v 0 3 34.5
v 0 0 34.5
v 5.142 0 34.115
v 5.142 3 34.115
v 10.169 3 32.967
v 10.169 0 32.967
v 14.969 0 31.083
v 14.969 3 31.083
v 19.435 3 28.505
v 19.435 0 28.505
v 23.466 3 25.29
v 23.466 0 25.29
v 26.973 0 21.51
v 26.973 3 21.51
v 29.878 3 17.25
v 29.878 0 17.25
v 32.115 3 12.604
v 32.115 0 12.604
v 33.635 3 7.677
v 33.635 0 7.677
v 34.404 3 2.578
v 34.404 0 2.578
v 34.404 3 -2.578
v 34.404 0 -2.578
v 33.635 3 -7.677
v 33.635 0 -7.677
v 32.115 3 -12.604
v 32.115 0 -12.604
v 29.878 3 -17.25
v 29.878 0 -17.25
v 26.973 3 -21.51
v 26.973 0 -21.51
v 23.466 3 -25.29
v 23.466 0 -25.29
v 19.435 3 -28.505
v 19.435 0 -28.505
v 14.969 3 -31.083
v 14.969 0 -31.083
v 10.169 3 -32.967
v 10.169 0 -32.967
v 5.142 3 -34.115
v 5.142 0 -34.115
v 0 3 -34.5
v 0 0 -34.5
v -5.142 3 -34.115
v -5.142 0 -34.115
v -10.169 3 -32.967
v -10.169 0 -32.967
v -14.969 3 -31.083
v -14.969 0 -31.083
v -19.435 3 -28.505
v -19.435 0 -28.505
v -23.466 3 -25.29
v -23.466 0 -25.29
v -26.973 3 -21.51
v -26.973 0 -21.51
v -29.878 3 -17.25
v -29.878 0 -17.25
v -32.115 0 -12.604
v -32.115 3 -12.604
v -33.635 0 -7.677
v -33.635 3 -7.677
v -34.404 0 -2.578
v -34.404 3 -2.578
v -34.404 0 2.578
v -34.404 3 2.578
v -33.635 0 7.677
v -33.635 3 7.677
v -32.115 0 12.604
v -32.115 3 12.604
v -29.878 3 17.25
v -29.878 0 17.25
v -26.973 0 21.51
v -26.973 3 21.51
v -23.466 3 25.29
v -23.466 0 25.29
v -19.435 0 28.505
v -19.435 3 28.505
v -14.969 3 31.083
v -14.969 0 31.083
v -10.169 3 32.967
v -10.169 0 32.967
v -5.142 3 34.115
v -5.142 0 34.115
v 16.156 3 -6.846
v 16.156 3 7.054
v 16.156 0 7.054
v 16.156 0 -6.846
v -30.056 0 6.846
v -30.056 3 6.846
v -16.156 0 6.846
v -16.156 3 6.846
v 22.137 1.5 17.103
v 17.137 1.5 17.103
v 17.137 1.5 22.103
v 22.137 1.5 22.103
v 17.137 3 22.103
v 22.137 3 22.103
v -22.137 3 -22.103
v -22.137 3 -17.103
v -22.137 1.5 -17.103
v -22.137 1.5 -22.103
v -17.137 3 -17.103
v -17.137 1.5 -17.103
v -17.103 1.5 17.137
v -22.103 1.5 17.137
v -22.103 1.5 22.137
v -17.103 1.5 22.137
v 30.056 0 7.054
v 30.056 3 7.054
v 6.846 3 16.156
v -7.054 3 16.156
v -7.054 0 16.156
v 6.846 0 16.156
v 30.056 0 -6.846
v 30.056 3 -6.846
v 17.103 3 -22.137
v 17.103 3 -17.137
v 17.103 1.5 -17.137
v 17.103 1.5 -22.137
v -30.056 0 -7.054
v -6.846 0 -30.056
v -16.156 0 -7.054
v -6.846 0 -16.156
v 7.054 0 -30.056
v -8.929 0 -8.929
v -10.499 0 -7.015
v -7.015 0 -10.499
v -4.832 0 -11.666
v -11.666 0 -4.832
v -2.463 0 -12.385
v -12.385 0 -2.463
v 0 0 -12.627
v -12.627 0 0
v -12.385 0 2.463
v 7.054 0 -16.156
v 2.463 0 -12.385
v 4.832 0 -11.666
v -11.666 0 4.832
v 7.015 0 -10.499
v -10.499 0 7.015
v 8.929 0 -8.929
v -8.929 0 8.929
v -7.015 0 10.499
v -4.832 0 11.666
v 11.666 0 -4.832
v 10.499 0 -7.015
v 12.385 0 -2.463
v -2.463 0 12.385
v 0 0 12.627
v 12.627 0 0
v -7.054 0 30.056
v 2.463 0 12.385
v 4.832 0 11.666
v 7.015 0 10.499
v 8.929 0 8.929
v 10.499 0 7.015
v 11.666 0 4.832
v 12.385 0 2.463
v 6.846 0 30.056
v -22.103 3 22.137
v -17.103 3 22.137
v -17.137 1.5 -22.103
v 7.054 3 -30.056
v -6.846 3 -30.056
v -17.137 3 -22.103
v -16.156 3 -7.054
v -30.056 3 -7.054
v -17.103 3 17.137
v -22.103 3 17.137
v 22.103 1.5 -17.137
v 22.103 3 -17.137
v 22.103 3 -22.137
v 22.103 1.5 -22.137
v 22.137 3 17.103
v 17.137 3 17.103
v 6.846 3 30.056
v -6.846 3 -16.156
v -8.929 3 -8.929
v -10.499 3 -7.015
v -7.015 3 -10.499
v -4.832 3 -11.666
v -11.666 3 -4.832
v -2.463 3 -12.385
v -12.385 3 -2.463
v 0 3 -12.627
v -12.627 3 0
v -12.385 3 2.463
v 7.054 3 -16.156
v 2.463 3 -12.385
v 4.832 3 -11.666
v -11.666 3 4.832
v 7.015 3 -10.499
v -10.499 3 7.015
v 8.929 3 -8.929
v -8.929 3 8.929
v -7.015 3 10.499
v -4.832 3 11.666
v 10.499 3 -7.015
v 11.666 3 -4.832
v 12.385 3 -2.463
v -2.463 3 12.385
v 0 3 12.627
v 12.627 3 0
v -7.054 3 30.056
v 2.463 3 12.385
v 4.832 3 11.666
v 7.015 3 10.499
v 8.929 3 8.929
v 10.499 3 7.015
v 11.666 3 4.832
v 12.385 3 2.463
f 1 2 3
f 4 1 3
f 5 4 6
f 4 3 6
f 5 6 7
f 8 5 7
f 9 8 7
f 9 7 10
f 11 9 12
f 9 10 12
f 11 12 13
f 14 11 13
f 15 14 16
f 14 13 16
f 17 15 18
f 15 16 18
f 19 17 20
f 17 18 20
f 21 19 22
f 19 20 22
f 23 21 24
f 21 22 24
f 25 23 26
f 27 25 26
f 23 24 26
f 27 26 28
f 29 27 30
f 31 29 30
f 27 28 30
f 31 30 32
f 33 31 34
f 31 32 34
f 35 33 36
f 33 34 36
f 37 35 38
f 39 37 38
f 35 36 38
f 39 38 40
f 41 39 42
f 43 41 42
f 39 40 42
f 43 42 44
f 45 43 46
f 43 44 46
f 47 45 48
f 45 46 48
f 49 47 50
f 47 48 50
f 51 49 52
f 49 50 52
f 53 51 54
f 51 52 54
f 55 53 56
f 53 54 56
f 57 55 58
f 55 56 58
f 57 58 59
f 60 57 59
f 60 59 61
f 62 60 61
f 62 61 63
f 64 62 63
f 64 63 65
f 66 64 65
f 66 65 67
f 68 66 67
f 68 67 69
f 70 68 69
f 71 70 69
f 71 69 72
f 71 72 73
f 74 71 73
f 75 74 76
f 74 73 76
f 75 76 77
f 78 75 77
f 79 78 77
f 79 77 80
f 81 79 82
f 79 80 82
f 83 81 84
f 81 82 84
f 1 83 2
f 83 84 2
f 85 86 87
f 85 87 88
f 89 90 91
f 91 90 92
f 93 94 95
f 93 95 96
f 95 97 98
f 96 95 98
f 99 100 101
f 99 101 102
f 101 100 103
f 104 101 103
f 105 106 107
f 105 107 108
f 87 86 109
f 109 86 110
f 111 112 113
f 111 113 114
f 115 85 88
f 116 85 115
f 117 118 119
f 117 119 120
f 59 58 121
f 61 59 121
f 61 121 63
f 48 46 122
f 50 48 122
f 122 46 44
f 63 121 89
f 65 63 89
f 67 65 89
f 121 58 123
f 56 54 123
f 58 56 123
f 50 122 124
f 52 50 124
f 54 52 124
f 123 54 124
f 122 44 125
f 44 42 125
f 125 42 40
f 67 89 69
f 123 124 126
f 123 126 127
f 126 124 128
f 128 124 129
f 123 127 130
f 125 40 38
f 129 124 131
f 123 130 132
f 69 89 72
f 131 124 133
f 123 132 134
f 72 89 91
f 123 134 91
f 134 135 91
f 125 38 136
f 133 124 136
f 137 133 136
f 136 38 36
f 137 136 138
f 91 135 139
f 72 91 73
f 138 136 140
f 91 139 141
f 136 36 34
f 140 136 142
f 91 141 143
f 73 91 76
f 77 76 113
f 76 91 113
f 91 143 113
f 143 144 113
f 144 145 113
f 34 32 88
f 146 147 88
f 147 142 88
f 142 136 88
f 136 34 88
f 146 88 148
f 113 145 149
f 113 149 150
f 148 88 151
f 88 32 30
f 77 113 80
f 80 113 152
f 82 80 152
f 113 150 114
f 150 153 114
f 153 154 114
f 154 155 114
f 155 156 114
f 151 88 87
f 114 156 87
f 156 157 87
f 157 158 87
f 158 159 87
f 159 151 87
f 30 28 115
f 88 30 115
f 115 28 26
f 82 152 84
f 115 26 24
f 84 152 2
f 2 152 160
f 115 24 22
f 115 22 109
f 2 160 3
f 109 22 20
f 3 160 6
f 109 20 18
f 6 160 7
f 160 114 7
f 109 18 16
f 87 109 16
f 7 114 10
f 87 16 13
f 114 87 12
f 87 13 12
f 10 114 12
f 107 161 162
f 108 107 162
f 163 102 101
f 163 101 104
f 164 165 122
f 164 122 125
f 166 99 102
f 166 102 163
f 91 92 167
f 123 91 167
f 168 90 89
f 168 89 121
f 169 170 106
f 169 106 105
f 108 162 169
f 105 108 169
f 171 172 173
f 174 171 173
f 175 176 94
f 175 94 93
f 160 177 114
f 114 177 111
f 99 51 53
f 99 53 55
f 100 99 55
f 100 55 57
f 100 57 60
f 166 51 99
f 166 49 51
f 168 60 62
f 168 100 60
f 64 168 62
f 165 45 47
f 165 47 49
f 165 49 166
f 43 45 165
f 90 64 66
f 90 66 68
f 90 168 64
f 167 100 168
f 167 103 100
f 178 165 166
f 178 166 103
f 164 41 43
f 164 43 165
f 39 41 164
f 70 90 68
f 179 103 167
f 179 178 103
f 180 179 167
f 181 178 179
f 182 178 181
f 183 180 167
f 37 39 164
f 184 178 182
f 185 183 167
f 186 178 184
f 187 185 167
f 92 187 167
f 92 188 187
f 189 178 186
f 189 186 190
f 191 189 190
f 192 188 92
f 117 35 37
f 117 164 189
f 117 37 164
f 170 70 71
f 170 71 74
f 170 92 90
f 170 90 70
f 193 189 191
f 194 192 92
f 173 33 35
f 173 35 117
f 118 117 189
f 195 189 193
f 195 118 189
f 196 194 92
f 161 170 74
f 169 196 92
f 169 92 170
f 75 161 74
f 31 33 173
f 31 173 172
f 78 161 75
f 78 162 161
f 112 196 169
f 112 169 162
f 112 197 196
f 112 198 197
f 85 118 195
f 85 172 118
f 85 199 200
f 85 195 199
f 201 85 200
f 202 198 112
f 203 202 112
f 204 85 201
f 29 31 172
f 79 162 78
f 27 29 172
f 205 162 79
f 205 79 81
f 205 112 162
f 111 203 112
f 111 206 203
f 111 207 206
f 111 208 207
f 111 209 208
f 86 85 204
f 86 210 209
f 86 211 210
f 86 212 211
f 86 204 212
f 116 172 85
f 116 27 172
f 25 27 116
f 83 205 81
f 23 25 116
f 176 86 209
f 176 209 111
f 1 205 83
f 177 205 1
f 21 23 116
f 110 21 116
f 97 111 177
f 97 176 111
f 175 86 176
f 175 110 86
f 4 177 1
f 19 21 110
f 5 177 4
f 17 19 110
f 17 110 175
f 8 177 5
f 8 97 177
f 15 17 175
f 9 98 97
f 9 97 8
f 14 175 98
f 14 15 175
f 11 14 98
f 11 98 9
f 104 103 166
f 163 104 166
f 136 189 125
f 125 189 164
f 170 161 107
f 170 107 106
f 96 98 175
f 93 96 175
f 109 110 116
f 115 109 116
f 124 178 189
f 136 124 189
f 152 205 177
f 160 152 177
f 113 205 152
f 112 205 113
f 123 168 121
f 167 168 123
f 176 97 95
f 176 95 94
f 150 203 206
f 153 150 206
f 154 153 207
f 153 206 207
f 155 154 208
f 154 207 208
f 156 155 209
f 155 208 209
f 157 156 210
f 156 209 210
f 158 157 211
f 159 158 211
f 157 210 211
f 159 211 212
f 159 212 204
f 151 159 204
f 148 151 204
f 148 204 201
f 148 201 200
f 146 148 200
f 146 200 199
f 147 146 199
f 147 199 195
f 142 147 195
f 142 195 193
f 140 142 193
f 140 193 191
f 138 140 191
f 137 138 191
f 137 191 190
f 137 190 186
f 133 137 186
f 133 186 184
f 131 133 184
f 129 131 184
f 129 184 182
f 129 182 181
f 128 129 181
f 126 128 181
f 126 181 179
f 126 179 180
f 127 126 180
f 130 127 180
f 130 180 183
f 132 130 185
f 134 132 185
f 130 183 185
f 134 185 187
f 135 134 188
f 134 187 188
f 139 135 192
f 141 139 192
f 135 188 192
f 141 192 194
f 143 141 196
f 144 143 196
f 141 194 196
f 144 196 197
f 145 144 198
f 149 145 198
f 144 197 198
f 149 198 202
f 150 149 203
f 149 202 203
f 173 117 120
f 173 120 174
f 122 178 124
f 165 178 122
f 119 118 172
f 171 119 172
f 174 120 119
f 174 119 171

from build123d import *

# Parameters (mm, degrees)
SKETCH1_R           = 34.5
BOSS_EXTRUDE1_DEPTH = 3
SKETCH3_W           = 13.9
SKETCH3_H           = 13.9
CUT_EXTRUDE1_DEPTH  = 49.88251221
SKETCH4_R           = 12.627177327
CUT_EXTRUDE2_DEPTH  = 49.88251221
SKETCH5_W           = 5
SKETCH5_H           = 5
CUT_EXTRUDE3_DEPTH  = 1.5


with BuildPart() as part:
    # Sketch1 → Boss-Extrude1 (new body)
    with BuildSketch(Plane(origin=(0, 0, 0), x_dir=(1, 0, 0), z_dir=(0, 1, 0))):
        with Locations(Location((0, 0, 0), (0, 0, 270))):
            Circle(SKETCH1_R)
    extrude(amount=BOSS_EXTRUDE1_DEPTH)

    # Sketch3 → Cut-Extrude1 (cut, through all)
    with BuildSketch(Plane(origin=(0, 3, 0), x_dir=(1, 0, 0), z_dir=(0, 1, 0))):
        with Locations((23.105624339, -0.103761809)):
            Rectangle(SKETCH3_W, SKETCH3_H)
        with Locations((0.103761809, 23.105624339)):
            Rectangle(SKETCH3_W, SKETCH3_H)
        with Locations((-0.103761809, -23.105624339)):
            Rectangle(SKETCH3_W, SKETCH3_H)
        with Locations((-23.105624339, 0.103761809)):
            Rectangle(SKETCH3_W, SKETCH3_H)
    extrude(amount=-CUT_EXTRUDE1_DEPTH, mode=Mode.SUBTRACT)

    # Sketch4 → Cut-Extrude2 (cut, through all)
    with BuildSketch(Plane(origin=(0, 3, 0), x_dir=(1, 0, 0), z_dir=(0, 1, 0))):
        with Locations(Location((0, 0, 0), (0, 0, 270))):
            Circle(SKETCH4_R)
    extrude(amount=-CUT_EXTRUDE2_DEPTH, mode=Mode.SUBTRACT)

    # Sketch5 → Cut-Extrude3 (cut)
    with BuildSketch(Plane(origin=(0, 3, 0), x_dir=(1, 0, 0), z_dir=(0, 1, 0))):
        with Locations((19.603168608, 19.636741271)):
            Rectangle(SKETCH5_W, SKETCH5_H)
        with Locations((-19.636741271, 19.603168608)):
            Rectangle(SKETCH5_W, SKETCH5_H)
        with Locations((19.636741271, -19.603168608)):
            Rectangle(SKETCH5_W, SKETCH5_H)
        with Locations((-19.603168608, -19.636741271)):
            Rectangle(SKETCH5_W, SKETCH5_H)
    extrude(amount=-CUT_EXTRUDE3_DEPTH, mode=Mode.SUBTRACT)


solid = part.part
